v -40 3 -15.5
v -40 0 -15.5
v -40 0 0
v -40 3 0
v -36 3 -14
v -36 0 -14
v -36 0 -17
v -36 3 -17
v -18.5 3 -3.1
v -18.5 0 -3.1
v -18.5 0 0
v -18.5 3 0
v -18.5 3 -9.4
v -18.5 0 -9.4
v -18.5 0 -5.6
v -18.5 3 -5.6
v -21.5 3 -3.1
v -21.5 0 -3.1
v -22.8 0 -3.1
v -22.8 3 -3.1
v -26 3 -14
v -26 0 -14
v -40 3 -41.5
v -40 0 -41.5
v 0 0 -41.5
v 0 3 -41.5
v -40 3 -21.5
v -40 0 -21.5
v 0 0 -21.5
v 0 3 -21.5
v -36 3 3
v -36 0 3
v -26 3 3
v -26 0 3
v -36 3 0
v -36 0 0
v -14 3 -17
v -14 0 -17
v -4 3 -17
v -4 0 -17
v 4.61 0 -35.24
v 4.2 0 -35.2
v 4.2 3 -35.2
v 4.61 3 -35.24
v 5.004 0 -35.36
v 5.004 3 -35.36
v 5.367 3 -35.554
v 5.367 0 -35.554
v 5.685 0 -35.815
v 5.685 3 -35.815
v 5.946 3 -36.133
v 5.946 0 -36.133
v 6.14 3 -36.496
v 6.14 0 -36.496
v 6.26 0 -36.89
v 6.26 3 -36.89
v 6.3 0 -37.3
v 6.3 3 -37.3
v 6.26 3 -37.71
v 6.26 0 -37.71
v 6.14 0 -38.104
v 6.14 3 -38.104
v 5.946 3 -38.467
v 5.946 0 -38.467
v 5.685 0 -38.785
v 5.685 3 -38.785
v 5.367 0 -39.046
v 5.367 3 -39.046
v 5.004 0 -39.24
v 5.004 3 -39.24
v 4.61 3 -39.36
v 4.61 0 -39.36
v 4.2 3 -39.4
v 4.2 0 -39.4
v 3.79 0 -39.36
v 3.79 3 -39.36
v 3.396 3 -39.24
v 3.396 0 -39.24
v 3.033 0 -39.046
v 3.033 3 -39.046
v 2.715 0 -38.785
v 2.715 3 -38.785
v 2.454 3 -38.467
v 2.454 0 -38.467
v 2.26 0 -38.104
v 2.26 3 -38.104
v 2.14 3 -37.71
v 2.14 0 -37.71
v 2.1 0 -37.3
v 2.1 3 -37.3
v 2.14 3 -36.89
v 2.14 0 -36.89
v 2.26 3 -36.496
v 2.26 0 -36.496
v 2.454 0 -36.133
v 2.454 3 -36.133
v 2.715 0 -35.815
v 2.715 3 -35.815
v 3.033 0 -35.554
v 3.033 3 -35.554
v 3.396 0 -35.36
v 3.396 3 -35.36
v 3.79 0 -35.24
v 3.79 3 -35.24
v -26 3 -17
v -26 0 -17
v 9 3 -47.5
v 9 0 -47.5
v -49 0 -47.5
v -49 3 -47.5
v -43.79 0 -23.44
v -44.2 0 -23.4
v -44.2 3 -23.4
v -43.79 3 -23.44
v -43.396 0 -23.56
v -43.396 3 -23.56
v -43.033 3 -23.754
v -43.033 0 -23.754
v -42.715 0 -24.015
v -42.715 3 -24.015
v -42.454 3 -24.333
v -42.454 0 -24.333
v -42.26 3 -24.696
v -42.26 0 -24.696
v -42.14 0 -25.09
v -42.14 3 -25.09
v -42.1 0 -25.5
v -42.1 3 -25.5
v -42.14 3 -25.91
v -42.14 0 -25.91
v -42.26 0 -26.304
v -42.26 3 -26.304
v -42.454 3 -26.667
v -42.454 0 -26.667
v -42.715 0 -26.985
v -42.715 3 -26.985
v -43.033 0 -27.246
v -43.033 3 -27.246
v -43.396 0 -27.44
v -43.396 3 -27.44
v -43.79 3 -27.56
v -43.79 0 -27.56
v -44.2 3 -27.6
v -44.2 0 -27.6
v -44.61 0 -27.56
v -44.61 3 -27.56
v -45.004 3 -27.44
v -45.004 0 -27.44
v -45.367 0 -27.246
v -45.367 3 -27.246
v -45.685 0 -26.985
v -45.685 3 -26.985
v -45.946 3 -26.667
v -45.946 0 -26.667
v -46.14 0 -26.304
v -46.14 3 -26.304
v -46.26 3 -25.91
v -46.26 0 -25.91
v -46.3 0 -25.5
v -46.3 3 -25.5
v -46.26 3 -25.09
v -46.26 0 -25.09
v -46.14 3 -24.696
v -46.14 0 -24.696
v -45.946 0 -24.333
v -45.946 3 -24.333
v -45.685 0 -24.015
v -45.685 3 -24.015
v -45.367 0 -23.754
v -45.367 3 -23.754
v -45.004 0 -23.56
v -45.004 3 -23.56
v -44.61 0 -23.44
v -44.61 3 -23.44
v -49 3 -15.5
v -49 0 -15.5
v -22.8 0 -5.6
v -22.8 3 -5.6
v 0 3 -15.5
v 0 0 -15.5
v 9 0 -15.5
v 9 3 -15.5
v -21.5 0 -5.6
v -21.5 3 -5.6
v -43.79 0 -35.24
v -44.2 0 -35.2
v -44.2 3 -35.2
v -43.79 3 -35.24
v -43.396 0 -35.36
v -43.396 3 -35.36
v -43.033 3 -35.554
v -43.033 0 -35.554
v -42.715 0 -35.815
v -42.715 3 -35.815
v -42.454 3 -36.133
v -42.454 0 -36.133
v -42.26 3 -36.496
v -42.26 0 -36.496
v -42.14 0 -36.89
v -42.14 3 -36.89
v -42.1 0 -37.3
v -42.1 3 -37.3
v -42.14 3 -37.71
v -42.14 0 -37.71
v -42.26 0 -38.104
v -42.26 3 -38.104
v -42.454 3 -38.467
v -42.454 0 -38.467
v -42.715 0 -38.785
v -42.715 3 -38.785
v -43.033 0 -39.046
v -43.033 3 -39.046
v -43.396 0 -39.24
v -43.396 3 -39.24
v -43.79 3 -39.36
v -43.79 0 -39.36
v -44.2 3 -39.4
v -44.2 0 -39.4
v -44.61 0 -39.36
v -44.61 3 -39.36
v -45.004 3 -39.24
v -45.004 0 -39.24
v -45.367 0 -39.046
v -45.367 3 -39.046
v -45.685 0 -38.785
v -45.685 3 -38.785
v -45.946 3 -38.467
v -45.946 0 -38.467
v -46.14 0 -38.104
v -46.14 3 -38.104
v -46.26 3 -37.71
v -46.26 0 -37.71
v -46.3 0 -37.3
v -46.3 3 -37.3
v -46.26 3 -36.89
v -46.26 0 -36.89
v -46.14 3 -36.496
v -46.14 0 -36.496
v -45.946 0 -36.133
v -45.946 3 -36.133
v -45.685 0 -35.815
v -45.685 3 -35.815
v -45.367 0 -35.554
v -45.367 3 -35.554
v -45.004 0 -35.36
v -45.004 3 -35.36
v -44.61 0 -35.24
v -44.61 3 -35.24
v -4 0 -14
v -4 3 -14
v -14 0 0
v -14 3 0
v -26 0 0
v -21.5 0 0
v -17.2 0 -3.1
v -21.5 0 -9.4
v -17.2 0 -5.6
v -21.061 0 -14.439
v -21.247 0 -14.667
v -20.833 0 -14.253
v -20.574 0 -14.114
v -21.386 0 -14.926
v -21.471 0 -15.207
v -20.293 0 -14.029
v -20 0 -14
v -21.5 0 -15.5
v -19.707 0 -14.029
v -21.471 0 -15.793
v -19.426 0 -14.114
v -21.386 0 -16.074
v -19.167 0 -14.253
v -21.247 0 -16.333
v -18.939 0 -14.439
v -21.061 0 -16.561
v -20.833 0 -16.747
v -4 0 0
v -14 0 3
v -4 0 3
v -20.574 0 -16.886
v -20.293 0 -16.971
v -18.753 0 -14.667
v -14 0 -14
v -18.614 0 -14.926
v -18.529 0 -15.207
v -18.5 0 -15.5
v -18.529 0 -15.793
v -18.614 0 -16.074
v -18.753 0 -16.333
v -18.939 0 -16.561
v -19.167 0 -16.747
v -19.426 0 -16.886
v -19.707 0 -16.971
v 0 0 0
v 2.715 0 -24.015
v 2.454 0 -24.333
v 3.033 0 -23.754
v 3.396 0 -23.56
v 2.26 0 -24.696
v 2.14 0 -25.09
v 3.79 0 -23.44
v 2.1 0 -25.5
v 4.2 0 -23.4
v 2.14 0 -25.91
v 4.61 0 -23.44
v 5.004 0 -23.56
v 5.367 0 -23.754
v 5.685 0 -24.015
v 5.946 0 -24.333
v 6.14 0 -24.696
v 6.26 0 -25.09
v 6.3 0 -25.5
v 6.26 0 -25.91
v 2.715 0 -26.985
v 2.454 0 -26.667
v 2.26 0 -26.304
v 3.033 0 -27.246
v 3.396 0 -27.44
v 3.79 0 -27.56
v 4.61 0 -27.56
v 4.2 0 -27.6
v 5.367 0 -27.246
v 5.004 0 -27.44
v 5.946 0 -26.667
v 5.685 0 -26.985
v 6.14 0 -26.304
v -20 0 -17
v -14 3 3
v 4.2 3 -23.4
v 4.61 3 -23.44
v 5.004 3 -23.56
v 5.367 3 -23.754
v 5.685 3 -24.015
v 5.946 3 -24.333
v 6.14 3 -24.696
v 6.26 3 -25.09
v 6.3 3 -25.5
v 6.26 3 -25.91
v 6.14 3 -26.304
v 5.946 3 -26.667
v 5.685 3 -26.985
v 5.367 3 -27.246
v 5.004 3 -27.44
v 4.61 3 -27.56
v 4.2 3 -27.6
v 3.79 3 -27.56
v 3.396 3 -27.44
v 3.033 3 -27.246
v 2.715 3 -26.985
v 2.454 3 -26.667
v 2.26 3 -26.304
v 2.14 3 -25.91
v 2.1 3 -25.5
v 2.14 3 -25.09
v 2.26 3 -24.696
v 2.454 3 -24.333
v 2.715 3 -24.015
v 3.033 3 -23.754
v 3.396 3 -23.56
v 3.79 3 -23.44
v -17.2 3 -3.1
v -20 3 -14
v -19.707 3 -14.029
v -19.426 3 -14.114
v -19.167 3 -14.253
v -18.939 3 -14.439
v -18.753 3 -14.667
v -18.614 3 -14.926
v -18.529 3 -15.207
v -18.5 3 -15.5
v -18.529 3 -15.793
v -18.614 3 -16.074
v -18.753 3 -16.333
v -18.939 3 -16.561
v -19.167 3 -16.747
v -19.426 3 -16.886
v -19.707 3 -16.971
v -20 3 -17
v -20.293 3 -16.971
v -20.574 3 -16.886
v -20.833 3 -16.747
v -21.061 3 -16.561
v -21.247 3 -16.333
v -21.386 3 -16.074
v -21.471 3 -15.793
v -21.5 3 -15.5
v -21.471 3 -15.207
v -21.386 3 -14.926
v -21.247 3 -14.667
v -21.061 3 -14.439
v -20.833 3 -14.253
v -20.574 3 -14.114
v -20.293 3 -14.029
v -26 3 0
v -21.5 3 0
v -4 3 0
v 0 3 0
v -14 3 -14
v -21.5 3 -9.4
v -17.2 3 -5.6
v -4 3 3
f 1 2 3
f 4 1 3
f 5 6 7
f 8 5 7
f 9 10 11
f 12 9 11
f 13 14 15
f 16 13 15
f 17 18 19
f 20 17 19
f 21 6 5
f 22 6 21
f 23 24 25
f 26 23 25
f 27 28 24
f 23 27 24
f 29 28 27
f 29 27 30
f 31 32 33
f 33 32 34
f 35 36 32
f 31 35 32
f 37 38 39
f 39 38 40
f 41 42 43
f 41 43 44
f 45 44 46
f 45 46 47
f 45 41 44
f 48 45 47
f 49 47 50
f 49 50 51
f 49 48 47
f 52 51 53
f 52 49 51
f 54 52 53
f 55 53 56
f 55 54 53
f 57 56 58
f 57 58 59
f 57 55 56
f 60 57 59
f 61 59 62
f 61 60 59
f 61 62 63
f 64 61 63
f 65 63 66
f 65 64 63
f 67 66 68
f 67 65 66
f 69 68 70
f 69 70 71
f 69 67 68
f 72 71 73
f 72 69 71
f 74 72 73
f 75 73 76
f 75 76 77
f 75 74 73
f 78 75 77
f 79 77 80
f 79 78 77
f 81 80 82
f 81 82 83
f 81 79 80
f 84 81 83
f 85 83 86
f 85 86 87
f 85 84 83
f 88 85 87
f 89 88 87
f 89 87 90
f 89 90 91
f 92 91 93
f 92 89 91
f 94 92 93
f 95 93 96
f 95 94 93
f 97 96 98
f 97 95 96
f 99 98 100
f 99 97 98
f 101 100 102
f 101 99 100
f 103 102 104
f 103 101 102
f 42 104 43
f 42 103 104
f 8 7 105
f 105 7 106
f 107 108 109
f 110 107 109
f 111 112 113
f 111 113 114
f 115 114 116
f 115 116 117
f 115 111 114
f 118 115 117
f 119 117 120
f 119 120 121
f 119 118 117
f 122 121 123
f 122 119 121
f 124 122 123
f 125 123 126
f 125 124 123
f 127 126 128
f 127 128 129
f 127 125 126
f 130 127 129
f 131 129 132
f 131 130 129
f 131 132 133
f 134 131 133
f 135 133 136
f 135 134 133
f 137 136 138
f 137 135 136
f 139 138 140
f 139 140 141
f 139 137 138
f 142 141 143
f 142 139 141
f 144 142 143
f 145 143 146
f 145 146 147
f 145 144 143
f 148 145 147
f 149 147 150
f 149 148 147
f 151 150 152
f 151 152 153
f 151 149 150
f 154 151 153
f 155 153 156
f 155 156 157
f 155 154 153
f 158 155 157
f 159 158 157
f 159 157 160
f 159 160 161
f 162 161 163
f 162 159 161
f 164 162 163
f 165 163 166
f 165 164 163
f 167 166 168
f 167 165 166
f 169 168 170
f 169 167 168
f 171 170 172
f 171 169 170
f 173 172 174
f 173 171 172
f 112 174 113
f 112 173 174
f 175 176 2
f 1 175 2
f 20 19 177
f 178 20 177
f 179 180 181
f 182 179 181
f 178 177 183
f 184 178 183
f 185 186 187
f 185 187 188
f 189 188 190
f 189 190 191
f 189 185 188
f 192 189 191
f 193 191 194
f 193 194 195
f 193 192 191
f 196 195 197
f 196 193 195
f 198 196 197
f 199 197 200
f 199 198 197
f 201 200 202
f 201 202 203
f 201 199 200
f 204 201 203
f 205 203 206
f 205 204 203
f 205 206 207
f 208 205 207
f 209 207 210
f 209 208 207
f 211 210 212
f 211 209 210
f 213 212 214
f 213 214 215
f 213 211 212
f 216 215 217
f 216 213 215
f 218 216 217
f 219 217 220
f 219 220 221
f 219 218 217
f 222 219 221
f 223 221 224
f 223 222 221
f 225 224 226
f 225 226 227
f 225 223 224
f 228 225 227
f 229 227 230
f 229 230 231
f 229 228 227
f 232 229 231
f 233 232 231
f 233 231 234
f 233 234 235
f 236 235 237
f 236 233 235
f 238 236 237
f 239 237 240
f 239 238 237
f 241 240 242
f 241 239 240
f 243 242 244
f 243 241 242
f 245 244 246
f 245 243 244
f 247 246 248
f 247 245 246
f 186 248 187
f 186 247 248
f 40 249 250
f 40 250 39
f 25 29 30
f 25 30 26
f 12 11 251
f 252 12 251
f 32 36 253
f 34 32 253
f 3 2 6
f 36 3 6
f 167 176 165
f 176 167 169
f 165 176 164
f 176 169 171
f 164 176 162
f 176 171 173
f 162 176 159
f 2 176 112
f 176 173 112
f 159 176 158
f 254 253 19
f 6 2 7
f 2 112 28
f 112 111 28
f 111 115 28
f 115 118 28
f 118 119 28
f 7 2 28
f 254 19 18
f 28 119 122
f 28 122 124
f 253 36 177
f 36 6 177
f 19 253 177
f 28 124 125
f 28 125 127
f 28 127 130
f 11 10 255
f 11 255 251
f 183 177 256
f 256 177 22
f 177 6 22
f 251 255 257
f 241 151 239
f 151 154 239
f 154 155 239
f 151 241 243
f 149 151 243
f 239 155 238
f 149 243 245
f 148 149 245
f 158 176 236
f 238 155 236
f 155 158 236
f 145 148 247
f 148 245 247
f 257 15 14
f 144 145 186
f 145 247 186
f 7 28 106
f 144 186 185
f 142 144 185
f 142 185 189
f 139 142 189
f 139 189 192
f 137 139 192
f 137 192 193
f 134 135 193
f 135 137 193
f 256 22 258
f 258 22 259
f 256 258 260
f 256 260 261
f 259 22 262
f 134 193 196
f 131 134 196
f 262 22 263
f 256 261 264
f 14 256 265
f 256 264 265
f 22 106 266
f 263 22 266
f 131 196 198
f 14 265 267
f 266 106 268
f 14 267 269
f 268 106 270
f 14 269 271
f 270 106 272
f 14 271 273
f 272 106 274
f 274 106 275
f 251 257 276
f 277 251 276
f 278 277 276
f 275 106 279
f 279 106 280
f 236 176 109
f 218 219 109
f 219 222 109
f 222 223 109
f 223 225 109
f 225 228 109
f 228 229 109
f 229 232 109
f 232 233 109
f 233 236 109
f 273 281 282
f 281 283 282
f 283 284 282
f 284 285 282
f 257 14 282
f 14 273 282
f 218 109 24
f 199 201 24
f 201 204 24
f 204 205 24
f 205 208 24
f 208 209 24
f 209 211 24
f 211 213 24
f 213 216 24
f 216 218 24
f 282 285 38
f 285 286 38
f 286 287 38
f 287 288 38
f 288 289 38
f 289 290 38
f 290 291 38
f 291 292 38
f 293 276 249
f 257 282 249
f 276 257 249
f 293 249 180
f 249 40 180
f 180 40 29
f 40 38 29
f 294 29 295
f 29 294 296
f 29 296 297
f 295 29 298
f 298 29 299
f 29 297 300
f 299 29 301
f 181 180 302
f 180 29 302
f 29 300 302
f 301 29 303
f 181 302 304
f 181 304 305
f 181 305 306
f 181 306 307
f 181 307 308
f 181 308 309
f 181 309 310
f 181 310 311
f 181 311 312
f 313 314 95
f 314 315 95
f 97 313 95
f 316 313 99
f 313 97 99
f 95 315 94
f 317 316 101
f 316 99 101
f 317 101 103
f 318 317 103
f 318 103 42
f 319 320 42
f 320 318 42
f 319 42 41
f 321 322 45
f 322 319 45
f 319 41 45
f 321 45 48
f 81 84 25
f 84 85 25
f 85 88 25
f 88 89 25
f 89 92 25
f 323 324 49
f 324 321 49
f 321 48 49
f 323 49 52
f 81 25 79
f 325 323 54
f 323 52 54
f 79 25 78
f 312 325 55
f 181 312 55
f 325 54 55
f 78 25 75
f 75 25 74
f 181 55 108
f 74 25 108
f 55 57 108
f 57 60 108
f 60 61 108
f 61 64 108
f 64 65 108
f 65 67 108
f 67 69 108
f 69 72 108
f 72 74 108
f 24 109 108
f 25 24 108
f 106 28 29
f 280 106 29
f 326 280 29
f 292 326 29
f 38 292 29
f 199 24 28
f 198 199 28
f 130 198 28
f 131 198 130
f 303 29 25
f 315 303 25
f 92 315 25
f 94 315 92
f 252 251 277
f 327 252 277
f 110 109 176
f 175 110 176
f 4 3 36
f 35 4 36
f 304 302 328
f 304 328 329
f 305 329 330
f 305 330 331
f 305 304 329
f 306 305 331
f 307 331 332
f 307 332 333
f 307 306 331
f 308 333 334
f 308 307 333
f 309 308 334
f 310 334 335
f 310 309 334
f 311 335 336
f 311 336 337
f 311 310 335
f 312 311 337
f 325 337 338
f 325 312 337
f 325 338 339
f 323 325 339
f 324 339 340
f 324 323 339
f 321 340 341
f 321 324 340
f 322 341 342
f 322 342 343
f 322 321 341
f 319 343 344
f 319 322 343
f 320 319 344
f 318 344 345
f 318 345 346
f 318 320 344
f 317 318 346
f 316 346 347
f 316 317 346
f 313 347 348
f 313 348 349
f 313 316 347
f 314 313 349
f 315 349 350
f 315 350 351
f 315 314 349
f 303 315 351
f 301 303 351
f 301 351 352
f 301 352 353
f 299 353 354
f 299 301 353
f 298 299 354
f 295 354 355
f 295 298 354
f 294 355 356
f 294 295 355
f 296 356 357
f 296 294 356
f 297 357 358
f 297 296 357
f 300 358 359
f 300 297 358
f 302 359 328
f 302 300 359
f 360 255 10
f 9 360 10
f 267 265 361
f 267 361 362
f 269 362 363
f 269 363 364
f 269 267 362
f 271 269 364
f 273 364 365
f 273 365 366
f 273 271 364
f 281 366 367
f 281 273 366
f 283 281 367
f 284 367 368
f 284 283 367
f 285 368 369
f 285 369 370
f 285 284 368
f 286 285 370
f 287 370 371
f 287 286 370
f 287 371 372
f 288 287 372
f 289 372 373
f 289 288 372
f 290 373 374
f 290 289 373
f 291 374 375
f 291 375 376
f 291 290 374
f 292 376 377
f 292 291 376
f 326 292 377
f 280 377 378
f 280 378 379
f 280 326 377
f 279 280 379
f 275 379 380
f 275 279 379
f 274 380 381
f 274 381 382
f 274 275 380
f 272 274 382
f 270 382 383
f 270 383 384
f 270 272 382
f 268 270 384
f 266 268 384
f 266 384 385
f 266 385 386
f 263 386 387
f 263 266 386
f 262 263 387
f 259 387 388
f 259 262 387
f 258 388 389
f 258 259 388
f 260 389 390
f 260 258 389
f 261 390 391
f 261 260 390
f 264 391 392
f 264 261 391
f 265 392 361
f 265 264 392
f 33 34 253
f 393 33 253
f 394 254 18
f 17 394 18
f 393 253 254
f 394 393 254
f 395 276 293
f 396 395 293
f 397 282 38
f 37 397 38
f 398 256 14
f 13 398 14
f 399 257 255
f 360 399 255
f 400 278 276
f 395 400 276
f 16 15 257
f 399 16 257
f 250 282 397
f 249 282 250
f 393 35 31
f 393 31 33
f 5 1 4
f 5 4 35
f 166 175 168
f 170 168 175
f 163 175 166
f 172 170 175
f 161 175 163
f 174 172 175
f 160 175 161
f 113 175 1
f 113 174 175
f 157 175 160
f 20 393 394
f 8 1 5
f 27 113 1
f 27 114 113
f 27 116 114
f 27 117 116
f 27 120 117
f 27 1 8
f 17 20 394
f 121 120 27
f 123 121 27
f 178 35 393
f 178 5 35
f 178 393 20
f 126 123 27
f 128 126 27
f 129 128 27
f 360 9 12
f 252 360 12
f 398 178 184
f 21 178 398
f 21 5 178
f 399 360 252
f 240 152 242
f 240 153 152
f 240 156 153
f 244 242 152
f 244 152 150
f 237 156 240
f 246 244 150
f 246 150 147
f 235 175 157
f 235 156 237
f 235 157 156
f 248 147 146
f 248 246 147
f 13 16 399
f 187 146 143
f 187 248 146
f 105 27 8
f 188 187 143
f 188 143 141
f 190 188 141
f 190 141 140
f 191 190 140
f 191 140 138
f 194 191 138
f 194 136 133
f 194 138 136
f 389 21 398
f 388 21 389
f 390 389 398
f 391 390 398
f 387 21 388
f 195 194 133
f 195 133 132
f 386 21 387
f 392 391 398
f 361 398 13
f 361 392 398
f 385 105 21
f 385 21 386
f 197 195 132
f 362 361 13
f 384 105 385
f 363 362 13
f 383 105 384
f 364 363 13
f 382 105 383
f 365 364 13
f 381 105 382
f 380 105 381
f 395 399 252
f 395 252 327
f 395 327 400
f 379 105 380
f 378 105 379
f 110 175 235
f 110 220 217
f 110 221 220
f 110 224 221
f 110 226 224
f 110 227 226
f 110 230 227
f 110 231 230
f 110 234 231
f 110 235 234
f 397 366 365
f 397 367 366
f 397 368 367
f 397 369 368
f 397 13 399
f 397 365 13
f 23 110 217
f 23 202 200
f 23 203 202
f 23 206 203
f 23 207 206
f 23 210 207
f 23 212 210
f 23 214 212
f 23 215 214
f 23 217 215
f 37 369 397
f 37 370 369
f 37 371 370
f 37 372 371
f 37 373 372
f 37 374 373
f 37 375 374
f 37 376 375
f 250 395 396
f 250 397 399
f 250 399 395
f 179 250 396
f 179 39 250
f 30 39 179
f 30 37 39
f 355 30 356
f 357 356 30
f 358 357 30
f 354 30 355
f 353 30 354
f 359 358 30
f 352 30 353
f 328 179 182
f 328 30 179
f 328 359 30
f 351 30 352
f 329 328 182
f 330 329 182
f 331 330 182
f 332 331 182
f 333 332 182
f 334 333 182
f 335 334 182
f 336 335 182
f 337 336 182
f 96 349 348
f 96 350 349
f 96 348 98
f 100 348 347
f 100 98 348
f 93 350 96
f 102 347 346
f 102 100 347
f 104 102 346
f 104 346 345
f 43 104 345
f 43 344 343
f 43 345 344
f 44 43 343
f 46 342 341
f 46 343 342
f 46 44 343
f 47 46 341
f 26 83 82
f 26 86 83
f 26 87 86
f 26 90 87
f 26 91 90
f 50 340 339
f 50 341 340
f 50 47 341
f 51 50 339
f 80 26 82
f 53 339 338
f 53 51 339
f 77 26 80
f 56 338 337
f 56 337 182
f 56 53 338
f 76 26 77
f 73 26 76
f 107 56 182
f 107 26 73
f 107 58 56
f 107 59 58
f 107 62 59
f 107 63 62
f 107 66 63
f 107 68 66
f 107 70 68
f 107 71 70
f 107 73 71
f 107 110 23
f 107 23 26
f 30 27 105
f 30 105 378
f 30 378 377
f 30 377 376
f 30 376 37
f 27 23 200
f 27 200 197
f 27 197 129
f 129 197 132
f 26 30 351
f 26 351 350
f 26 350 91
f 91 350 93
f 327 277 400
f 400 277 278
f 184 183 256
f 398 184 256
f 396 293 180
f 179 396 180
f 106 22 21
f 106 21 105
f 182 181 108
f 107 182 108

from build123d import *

# Parameters (mm, degrees)
SKETCH2_R           = 2.1
SKETCH2_R_2         = 1.5
SKETCH2_W           = 40
SKETCH2_H           = 20
SKETCH2_W_2         = 10
SKETCH2_H_2         = 3
BOSS_EXTRUDE1_DEPTH = 3


with BuildPart() as part:
    # Sketch2 → Boss-Extrude1 (new body)
    with BuildSketch(Plane(origin=(0, 0, 0), x_dir=(1, 0, 0), z_dir=(0, 1, 0))):
        Polygon((0, 15.5), (9, 15.5), (9, 47.5), (-49, 47.5), (-49, 15.5), (-40, 15.5), (-40, 0), (-36, 0), (-36, -3), (-26, -3), (-26, 0), (-21.5, 0), (-21.5, 3.1), (-22.8, 3.1), (-22.8, 5.6), (-21.5, 5.6), (-21.5, 9.4), (-18.5, 9.4), (-18.5, 5.6), (-17.2, 5.6), (-17.2, 3.1), (-18.5, 3.1), (-18.5, 0), (-14, 0), (-14, -3), (-4, -3), (-4, 0), (0, 0), align=None)
        with Locations(Location((4.2, 25.5, 0), (0, 0, 270))):
            Circle(SKETCH2_R, mode=Mode.SUBTRACT)
        with Locations(Location((4.2, 37.3, 0), (0, 0, 270))):
            Circle(SKETCH2_R, mode=Mode.SUBTRACT)
        with Locations(Location((-44.2, 37.3, 0), (0, 0, 270))):
            Circle(SKETCH2_R, mode=Mode.SUBTRACT)
        with Locations(Location((-44.2, 25.5, 0), (0, 0, 270))):
            Circle(SKETCH2_R, mode=Mode.SUBTRACT)
        with Locations(Location((-20, 15.5, 0), (0, 0, 270))):
            Circle(SKETCH2_R_2, mode=Mode.SUBTRACT)
        with Locations((-20, 31.5)):
            Rectangle(SKETCH2_W, SKETCH2_H, mode=Mode.SUBTRACT)
        with Locations((-31, 15.5)):
            Rectangle(SKETCH2_W_2, SKETCH2_H_2, mode=Mode.SUBTRACT)
        with Locations((-9, 15.5)):
            Rectangle(SKETCH2_W_2, SKETCH2_H_2, mode=Mode.SUBTRACT)
    extrude(amount=BOSS_EXTRUDE1_DEPTH)


solid = part.part
